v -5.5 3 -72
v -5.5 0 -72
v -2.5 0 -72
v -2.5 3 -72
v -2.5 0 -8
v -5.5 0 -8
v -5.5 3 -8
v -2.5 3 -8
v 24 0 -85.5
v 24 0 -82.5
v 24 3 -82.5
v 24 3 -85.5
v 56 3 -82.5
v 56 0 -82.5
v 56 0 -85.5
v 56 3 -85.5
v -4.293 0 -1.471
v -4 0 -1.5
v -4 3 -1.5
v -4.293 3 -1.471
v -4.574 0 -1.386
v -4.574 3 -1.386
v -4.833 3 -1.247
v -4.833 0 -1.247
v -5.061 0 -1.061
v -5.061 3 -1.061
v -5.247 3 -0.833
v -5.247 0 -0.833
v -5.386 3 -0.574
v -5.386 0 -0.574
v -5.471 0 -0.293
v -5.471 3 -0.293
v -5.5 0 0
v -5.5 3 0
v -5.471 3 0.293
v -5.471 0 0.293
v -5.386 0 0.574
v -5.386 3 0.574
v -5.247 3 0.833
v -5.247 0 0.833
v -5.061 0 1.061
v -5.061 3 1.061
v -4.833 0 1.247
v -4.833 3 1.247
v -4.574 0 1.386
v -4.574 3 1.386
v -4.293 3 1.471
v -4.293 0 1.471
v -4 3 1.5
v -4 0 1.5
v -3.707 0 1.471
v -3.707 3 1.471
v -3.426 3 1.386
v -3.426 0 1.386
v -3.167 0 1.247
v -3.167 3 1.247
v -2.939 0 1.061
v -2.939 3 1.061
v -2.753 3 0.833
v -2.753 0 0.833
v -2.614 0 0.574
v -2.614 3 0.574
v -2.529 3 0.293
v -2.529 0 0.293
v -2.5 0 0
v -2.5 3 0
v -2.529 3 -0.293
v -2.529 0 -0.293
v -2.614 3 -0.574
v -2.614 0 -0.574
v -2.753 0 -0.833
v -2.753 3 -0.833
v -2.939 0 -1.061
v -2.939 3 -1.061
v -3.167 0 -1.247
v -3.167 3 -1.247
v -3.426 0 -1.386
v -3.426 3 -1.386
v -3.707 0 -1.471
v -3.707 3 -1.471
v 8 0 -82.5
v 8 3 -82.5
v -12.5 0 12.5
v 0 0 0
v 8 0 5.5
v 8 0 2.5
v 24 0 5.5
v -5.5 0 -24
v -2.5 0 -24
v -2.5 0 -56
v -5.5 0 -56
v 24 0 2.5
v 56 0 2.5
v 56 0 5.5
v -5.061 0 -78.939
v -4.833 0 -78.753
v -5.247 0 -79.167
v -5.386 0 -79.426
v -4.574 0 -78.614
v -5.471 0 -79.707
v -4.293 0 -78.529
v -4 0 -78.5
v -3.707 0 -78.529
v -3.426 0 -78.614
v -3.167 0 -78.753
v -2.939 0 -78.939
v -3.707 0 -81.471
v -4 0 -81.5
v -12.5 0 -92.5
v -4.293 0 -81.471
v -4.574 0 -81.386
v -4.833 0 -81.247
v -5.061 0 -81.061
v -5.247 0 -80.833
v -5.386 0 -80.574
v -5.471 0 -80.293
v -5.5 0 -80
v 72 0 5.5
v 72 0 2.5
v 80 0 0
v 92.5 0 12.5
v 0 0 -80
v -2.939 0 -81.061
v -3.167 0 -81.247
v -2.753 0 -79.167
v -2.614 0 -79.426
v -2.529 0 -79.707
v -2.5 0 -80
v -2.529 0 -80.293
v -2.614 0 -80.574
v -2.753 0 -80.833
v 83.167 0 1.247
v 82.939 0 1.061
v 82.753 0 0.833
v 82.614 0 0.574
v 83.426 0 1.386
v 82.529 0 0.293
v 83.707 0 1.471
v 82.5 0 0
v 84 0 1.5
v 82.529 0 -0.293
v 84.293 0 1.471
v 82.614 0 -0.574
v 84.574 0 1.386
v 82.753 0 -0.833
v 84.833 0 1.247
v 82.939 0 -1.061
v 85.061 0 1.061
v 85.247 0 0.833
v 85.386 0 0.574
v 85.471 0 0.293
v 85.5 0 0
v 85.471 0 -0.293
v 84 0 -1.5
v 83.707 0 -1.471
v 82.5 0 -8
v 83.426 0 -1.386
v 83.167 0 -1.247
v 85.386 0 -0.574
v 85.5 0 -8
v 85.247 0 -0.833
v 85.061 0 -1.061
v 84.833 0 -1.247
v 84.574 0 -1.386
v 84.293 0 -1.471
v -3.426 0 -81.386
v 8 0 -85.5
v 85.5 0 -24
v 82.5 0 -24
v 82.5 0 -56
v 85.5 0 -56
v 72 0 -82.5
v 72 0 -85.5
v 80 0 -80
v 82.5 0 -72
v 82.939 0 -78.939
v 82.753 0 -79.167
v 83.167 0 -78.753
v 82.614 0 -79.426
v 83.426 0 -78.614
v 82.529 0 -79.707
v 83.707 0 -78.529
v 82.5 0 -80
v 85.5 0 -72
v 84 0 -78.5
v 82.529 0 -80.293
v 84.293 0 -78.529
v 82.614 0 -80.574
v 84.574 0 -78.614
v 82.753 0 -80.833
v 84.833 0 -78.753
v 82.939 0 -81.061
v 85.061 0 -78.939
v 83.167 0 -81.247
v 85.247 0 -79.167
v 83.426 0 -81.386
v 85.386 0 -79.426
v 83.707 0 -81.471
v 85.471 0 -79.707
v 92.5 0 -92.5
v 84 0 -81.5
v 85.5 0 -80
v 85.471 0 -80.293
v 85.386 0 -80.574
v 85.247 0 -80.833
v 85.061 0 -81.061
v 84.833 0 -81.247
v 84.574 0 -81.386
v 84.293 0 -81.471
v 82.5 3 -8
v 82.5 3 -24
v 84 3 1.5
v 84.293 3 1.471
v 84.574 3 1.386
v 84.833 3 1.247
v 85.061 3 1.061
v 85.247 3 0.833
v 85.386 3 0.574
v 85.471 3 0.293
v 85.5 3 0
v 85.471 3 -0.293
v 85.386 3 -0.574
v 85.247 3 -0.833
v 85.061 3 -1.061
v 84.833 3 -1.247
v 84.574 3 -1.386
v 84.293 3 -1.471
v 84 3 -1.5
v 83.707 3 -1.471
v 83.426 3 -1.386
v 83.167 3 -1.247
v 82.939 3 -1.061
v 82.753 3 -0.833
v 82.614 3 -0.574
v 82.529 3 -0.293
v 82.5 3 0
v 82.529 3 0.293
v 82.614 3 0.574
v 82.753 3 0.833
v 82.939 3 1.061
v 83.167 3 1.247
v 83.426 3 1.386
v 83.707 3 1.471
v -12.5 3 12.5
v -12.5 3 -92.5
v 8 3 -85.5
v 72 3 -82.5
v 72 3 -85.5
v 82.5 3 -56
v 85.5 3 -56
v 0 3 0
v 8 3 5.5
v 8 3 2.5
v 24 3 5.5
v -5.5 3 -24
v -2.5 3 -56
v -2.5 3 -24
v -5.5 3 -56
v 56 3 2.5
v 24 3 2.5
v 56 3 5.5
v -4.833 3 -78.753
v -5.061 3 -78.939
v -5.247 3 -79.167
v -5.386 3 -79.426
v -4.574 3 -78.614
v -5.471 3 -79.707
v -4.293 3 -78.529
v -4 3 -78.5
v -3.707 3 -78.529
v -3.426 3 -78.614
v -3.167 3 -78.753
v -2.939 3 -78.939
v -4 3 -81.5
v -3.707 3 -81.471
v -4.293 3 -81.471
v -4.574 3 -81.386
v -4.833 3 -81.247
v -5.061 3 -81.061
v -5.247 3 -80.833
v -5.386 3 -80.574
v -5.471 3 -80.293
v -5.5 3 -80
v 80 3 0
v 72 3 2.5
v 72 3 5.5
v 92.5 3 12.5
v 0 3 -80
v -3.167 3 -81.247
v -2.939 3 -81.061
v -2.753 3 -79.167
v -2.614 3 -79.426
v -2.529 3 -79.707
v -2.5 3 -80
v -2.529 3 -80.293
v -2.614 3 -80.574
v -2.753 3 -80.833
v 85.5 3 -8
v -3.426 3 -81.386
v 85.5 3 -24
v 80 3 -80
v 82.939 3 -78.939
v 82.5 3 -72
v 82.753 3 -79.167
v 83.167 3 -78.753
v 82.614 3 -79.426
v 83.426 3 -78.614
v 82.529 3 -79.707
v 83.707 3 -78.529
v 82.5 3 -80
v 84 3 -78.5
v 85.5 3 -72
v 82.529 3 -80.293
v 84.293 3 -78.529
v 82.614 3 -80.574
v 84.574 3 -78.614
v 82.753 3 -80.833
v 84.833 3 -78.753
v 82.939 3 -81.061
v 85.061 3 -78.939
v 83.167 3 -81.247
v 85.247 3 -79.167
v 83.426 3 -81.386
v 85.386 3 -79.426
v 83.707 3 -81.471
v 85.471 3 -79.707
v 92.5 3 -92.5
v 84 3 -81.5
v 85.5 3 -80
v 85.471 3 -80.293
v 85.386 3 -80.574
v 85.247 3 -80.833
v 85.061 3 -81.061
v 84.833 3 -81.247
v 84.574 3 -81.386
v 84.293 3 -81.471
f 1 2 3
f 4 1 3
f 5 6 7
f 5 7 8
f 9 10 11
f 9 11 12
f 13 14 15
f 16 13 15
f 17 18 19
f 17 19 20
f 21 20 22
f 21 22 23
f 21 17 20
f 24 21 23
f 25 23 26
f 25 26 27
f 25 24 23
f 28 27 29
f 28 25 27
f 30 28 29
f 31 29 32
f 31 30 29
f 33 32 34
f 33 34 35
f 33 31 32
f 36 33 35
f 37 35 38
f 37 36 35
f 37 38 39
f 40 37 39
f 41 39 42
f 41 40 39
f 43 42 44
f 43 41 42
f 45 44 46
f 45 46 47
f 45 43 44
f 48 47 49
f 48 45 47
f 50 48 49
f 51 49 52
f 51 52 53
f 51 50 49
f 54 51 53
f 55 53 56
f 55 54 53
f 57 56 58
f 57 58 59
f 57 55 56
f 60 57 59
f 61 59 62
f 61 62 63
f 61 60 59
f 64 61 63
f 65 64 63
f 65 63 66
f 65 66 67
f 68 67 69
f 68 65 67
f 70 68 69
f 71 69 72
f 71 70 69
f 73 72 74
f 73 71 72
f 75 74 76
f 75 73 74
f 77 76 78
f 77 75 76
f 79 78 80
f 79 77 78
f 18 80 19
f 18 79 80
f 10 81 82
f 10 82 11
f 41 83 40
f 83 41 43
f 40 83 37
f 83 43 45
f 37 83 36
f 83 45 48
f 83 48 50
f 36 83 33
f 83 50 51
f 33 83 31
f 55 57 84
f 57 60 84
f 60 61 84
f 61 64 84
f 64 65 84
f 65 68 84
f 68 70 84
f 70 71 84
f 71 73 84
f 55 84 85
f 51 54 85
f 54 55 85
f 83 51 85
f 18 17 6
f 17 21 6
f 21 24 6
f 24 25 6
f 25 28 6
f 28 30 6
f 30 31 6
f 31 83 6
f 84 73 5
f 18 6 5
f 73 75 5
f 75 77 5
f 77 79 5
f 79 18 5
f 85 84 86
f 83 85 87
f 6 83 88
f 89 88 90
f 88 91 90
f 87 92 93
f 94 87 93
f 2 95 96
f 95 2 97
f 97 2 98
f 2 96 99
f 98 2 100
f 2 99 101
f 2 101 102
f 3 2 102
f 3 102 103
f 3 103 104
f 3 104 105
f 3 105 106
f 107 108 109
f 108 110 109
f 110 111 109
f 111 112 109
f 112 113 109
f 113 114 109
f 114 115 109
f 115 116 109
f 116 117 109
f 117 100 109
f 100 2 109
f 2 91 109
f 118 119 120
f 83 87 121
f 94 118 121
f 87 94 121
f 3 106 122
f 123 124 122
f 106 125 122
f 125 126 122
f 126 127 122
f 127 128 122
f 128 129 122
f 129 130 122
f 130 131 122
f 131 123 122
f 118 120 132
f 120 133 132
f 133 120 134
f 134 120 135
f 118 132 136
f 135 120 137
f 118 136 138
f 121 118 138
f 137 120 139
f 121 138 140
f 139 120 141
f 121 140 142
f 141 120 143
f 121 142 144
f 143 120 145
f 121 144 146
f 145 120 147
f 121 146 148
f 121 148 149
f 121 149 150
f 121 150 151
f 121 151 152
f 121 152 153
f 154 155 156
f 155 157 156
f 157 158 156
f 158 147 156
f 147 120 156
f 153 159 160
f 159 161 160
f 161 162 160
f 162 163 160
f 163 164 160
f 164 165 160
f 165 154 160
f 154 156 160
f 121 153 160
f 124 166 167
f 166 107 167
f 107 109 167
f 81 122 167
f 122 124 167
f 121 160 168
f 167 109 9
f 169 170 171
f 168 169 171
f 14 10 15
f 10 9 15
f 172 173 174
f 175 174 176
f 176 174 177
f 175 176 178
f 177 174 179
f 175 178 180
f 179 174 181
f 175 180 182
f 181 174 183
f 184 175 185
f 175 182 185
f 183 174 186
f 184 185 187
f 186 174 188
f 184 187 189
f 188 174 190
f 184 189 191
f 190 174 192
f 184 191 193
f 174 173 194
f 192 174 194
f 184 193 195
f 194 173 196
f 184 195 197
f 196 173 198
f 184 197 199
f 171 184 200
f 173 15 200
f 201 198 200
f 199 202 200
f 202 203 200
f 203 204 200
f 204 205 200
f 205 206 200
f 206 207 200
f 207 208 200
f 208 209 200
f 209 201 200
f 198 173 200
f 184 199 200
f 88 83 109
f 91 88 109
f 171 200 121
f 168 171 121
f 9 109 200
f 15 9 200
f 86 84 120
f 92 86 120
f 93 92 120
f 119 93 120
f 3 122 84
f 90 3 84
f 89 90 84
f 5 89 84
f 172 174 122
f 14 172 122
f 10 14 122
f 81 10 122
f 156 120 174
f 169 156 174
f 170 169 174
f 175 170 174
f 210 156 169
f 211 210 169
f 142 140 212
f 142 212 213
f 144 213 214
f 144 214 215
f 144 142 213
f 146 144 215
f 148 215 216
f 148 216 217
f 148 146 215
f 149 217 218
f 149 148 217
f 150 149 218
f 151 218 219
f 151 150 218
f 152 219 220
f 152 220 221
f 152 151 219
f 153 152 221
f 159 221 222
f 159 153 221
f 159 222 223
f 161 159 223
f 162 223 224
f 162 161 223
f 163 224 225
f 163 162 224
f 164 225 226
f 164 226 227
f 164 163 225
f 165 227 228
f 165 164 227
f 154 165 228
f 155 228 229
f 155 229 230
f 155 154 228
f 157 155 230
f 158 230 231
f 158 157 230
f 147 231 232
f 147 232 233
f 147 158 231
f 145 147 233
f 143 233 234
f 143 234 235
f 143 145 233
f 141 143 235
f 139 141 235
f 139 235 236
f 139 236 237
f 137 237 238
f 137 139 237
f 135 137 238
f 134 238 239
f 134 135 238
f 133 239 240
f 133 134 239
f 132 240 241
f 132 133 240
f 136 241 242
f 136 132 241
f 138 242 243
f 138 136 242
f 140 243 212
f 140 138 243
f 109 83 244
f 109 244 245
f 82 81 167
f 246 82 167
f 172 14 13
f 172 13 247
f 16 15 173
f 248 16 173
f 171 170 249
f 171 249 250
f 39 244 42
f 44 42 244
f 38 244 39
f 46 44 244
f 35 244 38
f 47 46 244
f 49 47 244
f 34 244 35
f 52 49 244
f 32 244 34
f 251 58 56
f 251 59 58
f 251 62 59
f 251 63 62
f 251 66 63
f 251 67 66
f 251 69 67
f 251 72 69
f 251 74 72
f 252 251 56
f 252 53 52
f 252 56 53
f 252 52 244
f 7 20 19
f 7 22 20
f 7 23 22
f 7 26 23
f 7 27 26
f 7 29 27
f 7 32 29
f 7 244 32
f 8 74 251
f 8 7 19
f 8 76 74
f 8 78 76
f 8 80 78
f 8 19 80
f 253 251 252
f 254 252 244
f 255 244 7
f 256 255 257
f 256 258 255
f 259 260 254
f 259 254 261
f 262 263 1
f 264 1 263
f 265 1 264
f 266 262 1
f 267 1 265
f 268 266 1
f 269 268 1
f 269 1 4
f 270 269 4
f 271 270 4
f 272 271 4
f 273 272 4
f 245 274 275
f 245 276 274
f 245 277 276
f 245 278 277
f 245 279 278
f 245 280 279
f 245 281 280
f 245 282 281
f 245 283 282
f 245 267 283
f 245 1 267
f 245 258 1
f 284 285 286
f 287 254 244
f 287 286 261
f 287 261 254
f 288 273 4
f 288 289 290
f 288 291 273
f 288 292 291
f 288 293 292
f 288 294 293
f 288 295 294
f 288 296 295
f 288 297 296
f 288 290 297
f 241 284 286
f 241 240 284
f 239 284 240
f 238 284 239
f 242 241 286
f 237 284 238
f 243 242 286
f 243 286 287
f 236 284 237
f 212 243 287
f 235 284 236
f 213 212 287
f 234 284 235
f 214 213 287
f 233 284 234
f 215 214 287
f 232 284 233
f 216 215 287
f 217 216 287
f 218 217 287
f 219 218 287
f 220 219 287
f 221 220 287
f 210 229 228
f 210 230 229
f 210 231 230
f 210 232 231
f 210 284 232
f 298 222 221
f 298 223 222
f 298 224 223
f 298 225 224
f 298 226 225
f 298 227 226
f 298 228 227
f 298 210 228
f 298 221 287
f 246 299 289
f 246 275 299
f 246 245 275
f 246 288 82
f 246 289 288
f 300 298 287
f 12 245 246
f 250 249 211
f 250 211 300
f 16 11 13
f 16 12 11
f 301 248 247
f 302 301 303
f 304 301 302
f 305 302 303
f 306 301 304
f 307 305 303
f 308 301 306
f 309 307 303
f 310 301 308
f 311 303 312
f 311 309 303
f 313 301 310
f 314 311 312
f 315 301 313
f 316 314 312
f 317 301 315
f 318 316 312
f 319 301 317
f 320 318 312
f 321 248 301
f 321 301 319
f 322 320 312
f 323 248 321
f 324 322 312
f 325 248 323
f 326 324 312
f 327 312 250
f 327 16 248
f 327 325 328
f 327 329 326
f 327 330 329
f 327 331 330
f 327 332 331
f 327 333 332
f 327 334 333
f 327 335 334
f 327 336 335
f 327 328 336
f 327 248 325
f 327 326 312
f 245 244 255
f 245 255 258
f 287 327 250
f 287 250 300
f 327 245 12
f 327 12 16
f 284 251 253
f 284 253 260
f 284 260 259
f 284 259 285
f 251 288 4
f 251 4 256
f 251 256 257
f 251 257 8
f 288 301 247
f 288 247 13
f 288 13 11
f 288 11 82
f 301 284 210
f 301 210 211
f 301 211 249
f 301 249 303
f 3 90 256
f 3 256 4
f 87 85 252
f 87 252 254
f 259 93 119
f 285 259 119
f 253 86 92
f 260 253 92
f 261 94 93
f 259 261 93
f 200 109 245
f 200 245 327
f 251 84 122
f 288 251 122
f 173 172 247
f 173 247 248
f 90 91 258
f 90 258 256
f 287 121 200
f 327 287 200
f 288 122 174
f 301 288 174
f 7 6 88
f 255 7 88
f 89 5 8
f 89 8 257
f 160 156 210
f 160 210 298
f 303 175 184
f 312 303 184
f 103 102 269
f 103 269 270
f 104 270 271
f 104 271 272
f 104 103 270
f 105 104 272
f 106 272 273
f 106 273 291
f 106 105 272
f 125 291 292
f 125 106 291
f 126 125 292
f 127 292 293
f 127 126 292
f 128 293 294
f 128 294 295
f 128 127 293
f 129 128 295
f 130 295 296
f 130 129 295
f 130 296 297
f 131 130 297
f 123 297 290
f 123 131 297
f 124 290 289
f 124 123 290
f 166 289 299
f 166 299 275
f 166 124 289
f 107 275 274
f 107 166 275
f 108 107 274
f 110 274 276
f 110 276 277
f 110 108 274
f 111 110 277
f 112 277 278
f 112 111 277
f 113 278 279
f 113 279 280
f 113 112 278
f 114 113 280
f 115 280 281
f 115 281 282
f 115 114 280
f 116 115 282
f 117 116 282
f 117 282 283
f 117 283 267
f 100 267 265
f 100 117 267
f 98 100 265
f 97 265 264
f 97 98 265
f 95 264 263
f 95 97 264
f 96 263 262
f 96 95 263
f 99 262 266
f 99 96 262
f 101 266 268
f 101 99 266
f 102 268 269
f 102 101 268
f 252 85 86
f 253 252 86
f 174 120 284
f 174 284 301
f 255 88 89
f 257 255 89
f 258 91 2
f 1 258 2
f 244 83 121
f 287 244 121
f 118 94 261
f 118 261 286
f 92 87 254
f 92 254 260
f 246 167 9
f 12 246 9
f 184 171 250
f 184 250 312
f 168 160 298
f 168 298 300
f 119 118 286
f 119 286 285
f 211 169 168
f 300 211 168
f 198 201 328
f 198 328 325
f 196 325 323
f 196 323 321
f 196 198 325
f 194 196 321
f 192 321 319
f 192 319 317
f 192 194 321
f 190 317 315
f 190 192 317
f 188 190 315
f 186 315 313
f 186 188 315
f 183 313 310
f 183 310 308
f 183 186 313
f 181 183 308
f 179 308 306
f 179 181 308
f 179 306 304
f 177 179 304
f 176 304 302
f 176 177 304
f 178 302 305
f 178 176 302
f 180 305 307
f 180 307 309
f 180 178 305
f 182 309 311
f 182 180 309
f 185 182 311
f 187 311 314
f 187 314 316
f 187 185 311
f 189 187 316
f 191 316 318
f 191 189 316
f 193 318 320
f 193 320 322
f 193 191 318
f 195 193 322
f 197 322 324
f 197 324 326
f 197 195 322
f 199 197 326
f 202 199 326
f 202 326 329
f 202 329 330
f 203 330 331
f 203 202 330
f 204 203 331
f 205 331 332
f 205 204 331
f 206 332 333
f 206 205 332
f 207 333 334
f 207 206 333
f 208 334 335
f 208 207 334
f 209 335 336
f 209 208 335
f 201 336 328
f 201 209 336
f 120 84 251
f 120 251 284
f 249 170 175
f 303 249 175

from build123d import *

# Parameters (mm, degrees)
CROQUIS1_W              = 105
CROQUIS1_H              = 105
CROQUIS1_R              = 1.5
CROQUIS1_W_2            = 80
CROQUIS1_H_2            = 80
CROQUIS1_W_3            = 16
CROQUIS1_H_3            = 3
CROQUIS1_W_4            = 3
CROQUIS1_H_4            = 16
SALIENTE_EXTRUIR1_DEPTH = 3


with BuildPart() as part:
    # Croquis1 → Saliente-Extruir1 (new body)
    with BuildSketch(Plane(origin=(0, 0, 0), x_dir=(1, 0, 0), z_dir=(0, 1, 0))):
        with Locations((40, 40)):
            Rectangle(CROQUIS1_W, CROQUIS1_H)
        with Locations(Location((84, 0, 0), (0, 0, 270))):
            Circle(CROQUIS1_R, mode=Mode.SUBTRACT)
        with Locations(Location((84, 80, 0), (0, 0, 90))):
            Circle(CROQUIS1_R, mode=Mode.SUBTRACT)
        with Locations(Location((-4, 80, 0), (0, 0, 270))):
            Circle(CROQUIS1_R, mode=Mode.SUBTRACT)
        with Locations(Location((-4, 0, 0), (0, 0, 90))):
            Circle(CROQUIS1_R, mode=Mode.SUBTRACT)
        with Locations((40, 40)):
            Rectangle(CROQUIS1_W_2, CROQUIS1_H_2, mode=Mode.SUBTRACT)
        with Locations((16, -4)):
            Rectangle(CROQUIS1_W_3, CROQUIS1_H_3, mode=Mode.SUBTRACT)
        with Locations((84, 64)):
            Rectangle(CROQUIS1_W_4, CROQUIS1_H_4, mode=Mode.SUBTRACT)
        with Locations((84, 16)):
            Rectangle(CROQUIS1_W_4, CROQUIS1_H_4, mode=Mode.SUBTRACT)
        with Locations((-4, 16)):
            Rectangle(CROQUIS1_W_4, CROQUIS1_H_4, mode=Mode.SUBTRACT)
        with Locations((-4, 64)):
            Rectangle(CROQUIS1_W_4, CROQUIS1_H_4, mode=Mode.SUBTRACT)
        with Locations((64, -4)):
            Rectangle(CROQUIS1_W_3, CROQUIS1_H_3, mode=Mode.SUBTRACT)
        with Locations((64, 84)):
            Rectangle(CROQUIS1_W_3, CROQUIS1_H_3, mode=Mode.SUBTRACT)
        with Locations((16, 84)):
            Rectangle(CROQUIS1_W_3, CROQUIS1_H_3, mode=Mode.SUBTRACT)
    extrude(amount=SALIENTE_EXTRUIR1_DEPTH)


solid = part.part
